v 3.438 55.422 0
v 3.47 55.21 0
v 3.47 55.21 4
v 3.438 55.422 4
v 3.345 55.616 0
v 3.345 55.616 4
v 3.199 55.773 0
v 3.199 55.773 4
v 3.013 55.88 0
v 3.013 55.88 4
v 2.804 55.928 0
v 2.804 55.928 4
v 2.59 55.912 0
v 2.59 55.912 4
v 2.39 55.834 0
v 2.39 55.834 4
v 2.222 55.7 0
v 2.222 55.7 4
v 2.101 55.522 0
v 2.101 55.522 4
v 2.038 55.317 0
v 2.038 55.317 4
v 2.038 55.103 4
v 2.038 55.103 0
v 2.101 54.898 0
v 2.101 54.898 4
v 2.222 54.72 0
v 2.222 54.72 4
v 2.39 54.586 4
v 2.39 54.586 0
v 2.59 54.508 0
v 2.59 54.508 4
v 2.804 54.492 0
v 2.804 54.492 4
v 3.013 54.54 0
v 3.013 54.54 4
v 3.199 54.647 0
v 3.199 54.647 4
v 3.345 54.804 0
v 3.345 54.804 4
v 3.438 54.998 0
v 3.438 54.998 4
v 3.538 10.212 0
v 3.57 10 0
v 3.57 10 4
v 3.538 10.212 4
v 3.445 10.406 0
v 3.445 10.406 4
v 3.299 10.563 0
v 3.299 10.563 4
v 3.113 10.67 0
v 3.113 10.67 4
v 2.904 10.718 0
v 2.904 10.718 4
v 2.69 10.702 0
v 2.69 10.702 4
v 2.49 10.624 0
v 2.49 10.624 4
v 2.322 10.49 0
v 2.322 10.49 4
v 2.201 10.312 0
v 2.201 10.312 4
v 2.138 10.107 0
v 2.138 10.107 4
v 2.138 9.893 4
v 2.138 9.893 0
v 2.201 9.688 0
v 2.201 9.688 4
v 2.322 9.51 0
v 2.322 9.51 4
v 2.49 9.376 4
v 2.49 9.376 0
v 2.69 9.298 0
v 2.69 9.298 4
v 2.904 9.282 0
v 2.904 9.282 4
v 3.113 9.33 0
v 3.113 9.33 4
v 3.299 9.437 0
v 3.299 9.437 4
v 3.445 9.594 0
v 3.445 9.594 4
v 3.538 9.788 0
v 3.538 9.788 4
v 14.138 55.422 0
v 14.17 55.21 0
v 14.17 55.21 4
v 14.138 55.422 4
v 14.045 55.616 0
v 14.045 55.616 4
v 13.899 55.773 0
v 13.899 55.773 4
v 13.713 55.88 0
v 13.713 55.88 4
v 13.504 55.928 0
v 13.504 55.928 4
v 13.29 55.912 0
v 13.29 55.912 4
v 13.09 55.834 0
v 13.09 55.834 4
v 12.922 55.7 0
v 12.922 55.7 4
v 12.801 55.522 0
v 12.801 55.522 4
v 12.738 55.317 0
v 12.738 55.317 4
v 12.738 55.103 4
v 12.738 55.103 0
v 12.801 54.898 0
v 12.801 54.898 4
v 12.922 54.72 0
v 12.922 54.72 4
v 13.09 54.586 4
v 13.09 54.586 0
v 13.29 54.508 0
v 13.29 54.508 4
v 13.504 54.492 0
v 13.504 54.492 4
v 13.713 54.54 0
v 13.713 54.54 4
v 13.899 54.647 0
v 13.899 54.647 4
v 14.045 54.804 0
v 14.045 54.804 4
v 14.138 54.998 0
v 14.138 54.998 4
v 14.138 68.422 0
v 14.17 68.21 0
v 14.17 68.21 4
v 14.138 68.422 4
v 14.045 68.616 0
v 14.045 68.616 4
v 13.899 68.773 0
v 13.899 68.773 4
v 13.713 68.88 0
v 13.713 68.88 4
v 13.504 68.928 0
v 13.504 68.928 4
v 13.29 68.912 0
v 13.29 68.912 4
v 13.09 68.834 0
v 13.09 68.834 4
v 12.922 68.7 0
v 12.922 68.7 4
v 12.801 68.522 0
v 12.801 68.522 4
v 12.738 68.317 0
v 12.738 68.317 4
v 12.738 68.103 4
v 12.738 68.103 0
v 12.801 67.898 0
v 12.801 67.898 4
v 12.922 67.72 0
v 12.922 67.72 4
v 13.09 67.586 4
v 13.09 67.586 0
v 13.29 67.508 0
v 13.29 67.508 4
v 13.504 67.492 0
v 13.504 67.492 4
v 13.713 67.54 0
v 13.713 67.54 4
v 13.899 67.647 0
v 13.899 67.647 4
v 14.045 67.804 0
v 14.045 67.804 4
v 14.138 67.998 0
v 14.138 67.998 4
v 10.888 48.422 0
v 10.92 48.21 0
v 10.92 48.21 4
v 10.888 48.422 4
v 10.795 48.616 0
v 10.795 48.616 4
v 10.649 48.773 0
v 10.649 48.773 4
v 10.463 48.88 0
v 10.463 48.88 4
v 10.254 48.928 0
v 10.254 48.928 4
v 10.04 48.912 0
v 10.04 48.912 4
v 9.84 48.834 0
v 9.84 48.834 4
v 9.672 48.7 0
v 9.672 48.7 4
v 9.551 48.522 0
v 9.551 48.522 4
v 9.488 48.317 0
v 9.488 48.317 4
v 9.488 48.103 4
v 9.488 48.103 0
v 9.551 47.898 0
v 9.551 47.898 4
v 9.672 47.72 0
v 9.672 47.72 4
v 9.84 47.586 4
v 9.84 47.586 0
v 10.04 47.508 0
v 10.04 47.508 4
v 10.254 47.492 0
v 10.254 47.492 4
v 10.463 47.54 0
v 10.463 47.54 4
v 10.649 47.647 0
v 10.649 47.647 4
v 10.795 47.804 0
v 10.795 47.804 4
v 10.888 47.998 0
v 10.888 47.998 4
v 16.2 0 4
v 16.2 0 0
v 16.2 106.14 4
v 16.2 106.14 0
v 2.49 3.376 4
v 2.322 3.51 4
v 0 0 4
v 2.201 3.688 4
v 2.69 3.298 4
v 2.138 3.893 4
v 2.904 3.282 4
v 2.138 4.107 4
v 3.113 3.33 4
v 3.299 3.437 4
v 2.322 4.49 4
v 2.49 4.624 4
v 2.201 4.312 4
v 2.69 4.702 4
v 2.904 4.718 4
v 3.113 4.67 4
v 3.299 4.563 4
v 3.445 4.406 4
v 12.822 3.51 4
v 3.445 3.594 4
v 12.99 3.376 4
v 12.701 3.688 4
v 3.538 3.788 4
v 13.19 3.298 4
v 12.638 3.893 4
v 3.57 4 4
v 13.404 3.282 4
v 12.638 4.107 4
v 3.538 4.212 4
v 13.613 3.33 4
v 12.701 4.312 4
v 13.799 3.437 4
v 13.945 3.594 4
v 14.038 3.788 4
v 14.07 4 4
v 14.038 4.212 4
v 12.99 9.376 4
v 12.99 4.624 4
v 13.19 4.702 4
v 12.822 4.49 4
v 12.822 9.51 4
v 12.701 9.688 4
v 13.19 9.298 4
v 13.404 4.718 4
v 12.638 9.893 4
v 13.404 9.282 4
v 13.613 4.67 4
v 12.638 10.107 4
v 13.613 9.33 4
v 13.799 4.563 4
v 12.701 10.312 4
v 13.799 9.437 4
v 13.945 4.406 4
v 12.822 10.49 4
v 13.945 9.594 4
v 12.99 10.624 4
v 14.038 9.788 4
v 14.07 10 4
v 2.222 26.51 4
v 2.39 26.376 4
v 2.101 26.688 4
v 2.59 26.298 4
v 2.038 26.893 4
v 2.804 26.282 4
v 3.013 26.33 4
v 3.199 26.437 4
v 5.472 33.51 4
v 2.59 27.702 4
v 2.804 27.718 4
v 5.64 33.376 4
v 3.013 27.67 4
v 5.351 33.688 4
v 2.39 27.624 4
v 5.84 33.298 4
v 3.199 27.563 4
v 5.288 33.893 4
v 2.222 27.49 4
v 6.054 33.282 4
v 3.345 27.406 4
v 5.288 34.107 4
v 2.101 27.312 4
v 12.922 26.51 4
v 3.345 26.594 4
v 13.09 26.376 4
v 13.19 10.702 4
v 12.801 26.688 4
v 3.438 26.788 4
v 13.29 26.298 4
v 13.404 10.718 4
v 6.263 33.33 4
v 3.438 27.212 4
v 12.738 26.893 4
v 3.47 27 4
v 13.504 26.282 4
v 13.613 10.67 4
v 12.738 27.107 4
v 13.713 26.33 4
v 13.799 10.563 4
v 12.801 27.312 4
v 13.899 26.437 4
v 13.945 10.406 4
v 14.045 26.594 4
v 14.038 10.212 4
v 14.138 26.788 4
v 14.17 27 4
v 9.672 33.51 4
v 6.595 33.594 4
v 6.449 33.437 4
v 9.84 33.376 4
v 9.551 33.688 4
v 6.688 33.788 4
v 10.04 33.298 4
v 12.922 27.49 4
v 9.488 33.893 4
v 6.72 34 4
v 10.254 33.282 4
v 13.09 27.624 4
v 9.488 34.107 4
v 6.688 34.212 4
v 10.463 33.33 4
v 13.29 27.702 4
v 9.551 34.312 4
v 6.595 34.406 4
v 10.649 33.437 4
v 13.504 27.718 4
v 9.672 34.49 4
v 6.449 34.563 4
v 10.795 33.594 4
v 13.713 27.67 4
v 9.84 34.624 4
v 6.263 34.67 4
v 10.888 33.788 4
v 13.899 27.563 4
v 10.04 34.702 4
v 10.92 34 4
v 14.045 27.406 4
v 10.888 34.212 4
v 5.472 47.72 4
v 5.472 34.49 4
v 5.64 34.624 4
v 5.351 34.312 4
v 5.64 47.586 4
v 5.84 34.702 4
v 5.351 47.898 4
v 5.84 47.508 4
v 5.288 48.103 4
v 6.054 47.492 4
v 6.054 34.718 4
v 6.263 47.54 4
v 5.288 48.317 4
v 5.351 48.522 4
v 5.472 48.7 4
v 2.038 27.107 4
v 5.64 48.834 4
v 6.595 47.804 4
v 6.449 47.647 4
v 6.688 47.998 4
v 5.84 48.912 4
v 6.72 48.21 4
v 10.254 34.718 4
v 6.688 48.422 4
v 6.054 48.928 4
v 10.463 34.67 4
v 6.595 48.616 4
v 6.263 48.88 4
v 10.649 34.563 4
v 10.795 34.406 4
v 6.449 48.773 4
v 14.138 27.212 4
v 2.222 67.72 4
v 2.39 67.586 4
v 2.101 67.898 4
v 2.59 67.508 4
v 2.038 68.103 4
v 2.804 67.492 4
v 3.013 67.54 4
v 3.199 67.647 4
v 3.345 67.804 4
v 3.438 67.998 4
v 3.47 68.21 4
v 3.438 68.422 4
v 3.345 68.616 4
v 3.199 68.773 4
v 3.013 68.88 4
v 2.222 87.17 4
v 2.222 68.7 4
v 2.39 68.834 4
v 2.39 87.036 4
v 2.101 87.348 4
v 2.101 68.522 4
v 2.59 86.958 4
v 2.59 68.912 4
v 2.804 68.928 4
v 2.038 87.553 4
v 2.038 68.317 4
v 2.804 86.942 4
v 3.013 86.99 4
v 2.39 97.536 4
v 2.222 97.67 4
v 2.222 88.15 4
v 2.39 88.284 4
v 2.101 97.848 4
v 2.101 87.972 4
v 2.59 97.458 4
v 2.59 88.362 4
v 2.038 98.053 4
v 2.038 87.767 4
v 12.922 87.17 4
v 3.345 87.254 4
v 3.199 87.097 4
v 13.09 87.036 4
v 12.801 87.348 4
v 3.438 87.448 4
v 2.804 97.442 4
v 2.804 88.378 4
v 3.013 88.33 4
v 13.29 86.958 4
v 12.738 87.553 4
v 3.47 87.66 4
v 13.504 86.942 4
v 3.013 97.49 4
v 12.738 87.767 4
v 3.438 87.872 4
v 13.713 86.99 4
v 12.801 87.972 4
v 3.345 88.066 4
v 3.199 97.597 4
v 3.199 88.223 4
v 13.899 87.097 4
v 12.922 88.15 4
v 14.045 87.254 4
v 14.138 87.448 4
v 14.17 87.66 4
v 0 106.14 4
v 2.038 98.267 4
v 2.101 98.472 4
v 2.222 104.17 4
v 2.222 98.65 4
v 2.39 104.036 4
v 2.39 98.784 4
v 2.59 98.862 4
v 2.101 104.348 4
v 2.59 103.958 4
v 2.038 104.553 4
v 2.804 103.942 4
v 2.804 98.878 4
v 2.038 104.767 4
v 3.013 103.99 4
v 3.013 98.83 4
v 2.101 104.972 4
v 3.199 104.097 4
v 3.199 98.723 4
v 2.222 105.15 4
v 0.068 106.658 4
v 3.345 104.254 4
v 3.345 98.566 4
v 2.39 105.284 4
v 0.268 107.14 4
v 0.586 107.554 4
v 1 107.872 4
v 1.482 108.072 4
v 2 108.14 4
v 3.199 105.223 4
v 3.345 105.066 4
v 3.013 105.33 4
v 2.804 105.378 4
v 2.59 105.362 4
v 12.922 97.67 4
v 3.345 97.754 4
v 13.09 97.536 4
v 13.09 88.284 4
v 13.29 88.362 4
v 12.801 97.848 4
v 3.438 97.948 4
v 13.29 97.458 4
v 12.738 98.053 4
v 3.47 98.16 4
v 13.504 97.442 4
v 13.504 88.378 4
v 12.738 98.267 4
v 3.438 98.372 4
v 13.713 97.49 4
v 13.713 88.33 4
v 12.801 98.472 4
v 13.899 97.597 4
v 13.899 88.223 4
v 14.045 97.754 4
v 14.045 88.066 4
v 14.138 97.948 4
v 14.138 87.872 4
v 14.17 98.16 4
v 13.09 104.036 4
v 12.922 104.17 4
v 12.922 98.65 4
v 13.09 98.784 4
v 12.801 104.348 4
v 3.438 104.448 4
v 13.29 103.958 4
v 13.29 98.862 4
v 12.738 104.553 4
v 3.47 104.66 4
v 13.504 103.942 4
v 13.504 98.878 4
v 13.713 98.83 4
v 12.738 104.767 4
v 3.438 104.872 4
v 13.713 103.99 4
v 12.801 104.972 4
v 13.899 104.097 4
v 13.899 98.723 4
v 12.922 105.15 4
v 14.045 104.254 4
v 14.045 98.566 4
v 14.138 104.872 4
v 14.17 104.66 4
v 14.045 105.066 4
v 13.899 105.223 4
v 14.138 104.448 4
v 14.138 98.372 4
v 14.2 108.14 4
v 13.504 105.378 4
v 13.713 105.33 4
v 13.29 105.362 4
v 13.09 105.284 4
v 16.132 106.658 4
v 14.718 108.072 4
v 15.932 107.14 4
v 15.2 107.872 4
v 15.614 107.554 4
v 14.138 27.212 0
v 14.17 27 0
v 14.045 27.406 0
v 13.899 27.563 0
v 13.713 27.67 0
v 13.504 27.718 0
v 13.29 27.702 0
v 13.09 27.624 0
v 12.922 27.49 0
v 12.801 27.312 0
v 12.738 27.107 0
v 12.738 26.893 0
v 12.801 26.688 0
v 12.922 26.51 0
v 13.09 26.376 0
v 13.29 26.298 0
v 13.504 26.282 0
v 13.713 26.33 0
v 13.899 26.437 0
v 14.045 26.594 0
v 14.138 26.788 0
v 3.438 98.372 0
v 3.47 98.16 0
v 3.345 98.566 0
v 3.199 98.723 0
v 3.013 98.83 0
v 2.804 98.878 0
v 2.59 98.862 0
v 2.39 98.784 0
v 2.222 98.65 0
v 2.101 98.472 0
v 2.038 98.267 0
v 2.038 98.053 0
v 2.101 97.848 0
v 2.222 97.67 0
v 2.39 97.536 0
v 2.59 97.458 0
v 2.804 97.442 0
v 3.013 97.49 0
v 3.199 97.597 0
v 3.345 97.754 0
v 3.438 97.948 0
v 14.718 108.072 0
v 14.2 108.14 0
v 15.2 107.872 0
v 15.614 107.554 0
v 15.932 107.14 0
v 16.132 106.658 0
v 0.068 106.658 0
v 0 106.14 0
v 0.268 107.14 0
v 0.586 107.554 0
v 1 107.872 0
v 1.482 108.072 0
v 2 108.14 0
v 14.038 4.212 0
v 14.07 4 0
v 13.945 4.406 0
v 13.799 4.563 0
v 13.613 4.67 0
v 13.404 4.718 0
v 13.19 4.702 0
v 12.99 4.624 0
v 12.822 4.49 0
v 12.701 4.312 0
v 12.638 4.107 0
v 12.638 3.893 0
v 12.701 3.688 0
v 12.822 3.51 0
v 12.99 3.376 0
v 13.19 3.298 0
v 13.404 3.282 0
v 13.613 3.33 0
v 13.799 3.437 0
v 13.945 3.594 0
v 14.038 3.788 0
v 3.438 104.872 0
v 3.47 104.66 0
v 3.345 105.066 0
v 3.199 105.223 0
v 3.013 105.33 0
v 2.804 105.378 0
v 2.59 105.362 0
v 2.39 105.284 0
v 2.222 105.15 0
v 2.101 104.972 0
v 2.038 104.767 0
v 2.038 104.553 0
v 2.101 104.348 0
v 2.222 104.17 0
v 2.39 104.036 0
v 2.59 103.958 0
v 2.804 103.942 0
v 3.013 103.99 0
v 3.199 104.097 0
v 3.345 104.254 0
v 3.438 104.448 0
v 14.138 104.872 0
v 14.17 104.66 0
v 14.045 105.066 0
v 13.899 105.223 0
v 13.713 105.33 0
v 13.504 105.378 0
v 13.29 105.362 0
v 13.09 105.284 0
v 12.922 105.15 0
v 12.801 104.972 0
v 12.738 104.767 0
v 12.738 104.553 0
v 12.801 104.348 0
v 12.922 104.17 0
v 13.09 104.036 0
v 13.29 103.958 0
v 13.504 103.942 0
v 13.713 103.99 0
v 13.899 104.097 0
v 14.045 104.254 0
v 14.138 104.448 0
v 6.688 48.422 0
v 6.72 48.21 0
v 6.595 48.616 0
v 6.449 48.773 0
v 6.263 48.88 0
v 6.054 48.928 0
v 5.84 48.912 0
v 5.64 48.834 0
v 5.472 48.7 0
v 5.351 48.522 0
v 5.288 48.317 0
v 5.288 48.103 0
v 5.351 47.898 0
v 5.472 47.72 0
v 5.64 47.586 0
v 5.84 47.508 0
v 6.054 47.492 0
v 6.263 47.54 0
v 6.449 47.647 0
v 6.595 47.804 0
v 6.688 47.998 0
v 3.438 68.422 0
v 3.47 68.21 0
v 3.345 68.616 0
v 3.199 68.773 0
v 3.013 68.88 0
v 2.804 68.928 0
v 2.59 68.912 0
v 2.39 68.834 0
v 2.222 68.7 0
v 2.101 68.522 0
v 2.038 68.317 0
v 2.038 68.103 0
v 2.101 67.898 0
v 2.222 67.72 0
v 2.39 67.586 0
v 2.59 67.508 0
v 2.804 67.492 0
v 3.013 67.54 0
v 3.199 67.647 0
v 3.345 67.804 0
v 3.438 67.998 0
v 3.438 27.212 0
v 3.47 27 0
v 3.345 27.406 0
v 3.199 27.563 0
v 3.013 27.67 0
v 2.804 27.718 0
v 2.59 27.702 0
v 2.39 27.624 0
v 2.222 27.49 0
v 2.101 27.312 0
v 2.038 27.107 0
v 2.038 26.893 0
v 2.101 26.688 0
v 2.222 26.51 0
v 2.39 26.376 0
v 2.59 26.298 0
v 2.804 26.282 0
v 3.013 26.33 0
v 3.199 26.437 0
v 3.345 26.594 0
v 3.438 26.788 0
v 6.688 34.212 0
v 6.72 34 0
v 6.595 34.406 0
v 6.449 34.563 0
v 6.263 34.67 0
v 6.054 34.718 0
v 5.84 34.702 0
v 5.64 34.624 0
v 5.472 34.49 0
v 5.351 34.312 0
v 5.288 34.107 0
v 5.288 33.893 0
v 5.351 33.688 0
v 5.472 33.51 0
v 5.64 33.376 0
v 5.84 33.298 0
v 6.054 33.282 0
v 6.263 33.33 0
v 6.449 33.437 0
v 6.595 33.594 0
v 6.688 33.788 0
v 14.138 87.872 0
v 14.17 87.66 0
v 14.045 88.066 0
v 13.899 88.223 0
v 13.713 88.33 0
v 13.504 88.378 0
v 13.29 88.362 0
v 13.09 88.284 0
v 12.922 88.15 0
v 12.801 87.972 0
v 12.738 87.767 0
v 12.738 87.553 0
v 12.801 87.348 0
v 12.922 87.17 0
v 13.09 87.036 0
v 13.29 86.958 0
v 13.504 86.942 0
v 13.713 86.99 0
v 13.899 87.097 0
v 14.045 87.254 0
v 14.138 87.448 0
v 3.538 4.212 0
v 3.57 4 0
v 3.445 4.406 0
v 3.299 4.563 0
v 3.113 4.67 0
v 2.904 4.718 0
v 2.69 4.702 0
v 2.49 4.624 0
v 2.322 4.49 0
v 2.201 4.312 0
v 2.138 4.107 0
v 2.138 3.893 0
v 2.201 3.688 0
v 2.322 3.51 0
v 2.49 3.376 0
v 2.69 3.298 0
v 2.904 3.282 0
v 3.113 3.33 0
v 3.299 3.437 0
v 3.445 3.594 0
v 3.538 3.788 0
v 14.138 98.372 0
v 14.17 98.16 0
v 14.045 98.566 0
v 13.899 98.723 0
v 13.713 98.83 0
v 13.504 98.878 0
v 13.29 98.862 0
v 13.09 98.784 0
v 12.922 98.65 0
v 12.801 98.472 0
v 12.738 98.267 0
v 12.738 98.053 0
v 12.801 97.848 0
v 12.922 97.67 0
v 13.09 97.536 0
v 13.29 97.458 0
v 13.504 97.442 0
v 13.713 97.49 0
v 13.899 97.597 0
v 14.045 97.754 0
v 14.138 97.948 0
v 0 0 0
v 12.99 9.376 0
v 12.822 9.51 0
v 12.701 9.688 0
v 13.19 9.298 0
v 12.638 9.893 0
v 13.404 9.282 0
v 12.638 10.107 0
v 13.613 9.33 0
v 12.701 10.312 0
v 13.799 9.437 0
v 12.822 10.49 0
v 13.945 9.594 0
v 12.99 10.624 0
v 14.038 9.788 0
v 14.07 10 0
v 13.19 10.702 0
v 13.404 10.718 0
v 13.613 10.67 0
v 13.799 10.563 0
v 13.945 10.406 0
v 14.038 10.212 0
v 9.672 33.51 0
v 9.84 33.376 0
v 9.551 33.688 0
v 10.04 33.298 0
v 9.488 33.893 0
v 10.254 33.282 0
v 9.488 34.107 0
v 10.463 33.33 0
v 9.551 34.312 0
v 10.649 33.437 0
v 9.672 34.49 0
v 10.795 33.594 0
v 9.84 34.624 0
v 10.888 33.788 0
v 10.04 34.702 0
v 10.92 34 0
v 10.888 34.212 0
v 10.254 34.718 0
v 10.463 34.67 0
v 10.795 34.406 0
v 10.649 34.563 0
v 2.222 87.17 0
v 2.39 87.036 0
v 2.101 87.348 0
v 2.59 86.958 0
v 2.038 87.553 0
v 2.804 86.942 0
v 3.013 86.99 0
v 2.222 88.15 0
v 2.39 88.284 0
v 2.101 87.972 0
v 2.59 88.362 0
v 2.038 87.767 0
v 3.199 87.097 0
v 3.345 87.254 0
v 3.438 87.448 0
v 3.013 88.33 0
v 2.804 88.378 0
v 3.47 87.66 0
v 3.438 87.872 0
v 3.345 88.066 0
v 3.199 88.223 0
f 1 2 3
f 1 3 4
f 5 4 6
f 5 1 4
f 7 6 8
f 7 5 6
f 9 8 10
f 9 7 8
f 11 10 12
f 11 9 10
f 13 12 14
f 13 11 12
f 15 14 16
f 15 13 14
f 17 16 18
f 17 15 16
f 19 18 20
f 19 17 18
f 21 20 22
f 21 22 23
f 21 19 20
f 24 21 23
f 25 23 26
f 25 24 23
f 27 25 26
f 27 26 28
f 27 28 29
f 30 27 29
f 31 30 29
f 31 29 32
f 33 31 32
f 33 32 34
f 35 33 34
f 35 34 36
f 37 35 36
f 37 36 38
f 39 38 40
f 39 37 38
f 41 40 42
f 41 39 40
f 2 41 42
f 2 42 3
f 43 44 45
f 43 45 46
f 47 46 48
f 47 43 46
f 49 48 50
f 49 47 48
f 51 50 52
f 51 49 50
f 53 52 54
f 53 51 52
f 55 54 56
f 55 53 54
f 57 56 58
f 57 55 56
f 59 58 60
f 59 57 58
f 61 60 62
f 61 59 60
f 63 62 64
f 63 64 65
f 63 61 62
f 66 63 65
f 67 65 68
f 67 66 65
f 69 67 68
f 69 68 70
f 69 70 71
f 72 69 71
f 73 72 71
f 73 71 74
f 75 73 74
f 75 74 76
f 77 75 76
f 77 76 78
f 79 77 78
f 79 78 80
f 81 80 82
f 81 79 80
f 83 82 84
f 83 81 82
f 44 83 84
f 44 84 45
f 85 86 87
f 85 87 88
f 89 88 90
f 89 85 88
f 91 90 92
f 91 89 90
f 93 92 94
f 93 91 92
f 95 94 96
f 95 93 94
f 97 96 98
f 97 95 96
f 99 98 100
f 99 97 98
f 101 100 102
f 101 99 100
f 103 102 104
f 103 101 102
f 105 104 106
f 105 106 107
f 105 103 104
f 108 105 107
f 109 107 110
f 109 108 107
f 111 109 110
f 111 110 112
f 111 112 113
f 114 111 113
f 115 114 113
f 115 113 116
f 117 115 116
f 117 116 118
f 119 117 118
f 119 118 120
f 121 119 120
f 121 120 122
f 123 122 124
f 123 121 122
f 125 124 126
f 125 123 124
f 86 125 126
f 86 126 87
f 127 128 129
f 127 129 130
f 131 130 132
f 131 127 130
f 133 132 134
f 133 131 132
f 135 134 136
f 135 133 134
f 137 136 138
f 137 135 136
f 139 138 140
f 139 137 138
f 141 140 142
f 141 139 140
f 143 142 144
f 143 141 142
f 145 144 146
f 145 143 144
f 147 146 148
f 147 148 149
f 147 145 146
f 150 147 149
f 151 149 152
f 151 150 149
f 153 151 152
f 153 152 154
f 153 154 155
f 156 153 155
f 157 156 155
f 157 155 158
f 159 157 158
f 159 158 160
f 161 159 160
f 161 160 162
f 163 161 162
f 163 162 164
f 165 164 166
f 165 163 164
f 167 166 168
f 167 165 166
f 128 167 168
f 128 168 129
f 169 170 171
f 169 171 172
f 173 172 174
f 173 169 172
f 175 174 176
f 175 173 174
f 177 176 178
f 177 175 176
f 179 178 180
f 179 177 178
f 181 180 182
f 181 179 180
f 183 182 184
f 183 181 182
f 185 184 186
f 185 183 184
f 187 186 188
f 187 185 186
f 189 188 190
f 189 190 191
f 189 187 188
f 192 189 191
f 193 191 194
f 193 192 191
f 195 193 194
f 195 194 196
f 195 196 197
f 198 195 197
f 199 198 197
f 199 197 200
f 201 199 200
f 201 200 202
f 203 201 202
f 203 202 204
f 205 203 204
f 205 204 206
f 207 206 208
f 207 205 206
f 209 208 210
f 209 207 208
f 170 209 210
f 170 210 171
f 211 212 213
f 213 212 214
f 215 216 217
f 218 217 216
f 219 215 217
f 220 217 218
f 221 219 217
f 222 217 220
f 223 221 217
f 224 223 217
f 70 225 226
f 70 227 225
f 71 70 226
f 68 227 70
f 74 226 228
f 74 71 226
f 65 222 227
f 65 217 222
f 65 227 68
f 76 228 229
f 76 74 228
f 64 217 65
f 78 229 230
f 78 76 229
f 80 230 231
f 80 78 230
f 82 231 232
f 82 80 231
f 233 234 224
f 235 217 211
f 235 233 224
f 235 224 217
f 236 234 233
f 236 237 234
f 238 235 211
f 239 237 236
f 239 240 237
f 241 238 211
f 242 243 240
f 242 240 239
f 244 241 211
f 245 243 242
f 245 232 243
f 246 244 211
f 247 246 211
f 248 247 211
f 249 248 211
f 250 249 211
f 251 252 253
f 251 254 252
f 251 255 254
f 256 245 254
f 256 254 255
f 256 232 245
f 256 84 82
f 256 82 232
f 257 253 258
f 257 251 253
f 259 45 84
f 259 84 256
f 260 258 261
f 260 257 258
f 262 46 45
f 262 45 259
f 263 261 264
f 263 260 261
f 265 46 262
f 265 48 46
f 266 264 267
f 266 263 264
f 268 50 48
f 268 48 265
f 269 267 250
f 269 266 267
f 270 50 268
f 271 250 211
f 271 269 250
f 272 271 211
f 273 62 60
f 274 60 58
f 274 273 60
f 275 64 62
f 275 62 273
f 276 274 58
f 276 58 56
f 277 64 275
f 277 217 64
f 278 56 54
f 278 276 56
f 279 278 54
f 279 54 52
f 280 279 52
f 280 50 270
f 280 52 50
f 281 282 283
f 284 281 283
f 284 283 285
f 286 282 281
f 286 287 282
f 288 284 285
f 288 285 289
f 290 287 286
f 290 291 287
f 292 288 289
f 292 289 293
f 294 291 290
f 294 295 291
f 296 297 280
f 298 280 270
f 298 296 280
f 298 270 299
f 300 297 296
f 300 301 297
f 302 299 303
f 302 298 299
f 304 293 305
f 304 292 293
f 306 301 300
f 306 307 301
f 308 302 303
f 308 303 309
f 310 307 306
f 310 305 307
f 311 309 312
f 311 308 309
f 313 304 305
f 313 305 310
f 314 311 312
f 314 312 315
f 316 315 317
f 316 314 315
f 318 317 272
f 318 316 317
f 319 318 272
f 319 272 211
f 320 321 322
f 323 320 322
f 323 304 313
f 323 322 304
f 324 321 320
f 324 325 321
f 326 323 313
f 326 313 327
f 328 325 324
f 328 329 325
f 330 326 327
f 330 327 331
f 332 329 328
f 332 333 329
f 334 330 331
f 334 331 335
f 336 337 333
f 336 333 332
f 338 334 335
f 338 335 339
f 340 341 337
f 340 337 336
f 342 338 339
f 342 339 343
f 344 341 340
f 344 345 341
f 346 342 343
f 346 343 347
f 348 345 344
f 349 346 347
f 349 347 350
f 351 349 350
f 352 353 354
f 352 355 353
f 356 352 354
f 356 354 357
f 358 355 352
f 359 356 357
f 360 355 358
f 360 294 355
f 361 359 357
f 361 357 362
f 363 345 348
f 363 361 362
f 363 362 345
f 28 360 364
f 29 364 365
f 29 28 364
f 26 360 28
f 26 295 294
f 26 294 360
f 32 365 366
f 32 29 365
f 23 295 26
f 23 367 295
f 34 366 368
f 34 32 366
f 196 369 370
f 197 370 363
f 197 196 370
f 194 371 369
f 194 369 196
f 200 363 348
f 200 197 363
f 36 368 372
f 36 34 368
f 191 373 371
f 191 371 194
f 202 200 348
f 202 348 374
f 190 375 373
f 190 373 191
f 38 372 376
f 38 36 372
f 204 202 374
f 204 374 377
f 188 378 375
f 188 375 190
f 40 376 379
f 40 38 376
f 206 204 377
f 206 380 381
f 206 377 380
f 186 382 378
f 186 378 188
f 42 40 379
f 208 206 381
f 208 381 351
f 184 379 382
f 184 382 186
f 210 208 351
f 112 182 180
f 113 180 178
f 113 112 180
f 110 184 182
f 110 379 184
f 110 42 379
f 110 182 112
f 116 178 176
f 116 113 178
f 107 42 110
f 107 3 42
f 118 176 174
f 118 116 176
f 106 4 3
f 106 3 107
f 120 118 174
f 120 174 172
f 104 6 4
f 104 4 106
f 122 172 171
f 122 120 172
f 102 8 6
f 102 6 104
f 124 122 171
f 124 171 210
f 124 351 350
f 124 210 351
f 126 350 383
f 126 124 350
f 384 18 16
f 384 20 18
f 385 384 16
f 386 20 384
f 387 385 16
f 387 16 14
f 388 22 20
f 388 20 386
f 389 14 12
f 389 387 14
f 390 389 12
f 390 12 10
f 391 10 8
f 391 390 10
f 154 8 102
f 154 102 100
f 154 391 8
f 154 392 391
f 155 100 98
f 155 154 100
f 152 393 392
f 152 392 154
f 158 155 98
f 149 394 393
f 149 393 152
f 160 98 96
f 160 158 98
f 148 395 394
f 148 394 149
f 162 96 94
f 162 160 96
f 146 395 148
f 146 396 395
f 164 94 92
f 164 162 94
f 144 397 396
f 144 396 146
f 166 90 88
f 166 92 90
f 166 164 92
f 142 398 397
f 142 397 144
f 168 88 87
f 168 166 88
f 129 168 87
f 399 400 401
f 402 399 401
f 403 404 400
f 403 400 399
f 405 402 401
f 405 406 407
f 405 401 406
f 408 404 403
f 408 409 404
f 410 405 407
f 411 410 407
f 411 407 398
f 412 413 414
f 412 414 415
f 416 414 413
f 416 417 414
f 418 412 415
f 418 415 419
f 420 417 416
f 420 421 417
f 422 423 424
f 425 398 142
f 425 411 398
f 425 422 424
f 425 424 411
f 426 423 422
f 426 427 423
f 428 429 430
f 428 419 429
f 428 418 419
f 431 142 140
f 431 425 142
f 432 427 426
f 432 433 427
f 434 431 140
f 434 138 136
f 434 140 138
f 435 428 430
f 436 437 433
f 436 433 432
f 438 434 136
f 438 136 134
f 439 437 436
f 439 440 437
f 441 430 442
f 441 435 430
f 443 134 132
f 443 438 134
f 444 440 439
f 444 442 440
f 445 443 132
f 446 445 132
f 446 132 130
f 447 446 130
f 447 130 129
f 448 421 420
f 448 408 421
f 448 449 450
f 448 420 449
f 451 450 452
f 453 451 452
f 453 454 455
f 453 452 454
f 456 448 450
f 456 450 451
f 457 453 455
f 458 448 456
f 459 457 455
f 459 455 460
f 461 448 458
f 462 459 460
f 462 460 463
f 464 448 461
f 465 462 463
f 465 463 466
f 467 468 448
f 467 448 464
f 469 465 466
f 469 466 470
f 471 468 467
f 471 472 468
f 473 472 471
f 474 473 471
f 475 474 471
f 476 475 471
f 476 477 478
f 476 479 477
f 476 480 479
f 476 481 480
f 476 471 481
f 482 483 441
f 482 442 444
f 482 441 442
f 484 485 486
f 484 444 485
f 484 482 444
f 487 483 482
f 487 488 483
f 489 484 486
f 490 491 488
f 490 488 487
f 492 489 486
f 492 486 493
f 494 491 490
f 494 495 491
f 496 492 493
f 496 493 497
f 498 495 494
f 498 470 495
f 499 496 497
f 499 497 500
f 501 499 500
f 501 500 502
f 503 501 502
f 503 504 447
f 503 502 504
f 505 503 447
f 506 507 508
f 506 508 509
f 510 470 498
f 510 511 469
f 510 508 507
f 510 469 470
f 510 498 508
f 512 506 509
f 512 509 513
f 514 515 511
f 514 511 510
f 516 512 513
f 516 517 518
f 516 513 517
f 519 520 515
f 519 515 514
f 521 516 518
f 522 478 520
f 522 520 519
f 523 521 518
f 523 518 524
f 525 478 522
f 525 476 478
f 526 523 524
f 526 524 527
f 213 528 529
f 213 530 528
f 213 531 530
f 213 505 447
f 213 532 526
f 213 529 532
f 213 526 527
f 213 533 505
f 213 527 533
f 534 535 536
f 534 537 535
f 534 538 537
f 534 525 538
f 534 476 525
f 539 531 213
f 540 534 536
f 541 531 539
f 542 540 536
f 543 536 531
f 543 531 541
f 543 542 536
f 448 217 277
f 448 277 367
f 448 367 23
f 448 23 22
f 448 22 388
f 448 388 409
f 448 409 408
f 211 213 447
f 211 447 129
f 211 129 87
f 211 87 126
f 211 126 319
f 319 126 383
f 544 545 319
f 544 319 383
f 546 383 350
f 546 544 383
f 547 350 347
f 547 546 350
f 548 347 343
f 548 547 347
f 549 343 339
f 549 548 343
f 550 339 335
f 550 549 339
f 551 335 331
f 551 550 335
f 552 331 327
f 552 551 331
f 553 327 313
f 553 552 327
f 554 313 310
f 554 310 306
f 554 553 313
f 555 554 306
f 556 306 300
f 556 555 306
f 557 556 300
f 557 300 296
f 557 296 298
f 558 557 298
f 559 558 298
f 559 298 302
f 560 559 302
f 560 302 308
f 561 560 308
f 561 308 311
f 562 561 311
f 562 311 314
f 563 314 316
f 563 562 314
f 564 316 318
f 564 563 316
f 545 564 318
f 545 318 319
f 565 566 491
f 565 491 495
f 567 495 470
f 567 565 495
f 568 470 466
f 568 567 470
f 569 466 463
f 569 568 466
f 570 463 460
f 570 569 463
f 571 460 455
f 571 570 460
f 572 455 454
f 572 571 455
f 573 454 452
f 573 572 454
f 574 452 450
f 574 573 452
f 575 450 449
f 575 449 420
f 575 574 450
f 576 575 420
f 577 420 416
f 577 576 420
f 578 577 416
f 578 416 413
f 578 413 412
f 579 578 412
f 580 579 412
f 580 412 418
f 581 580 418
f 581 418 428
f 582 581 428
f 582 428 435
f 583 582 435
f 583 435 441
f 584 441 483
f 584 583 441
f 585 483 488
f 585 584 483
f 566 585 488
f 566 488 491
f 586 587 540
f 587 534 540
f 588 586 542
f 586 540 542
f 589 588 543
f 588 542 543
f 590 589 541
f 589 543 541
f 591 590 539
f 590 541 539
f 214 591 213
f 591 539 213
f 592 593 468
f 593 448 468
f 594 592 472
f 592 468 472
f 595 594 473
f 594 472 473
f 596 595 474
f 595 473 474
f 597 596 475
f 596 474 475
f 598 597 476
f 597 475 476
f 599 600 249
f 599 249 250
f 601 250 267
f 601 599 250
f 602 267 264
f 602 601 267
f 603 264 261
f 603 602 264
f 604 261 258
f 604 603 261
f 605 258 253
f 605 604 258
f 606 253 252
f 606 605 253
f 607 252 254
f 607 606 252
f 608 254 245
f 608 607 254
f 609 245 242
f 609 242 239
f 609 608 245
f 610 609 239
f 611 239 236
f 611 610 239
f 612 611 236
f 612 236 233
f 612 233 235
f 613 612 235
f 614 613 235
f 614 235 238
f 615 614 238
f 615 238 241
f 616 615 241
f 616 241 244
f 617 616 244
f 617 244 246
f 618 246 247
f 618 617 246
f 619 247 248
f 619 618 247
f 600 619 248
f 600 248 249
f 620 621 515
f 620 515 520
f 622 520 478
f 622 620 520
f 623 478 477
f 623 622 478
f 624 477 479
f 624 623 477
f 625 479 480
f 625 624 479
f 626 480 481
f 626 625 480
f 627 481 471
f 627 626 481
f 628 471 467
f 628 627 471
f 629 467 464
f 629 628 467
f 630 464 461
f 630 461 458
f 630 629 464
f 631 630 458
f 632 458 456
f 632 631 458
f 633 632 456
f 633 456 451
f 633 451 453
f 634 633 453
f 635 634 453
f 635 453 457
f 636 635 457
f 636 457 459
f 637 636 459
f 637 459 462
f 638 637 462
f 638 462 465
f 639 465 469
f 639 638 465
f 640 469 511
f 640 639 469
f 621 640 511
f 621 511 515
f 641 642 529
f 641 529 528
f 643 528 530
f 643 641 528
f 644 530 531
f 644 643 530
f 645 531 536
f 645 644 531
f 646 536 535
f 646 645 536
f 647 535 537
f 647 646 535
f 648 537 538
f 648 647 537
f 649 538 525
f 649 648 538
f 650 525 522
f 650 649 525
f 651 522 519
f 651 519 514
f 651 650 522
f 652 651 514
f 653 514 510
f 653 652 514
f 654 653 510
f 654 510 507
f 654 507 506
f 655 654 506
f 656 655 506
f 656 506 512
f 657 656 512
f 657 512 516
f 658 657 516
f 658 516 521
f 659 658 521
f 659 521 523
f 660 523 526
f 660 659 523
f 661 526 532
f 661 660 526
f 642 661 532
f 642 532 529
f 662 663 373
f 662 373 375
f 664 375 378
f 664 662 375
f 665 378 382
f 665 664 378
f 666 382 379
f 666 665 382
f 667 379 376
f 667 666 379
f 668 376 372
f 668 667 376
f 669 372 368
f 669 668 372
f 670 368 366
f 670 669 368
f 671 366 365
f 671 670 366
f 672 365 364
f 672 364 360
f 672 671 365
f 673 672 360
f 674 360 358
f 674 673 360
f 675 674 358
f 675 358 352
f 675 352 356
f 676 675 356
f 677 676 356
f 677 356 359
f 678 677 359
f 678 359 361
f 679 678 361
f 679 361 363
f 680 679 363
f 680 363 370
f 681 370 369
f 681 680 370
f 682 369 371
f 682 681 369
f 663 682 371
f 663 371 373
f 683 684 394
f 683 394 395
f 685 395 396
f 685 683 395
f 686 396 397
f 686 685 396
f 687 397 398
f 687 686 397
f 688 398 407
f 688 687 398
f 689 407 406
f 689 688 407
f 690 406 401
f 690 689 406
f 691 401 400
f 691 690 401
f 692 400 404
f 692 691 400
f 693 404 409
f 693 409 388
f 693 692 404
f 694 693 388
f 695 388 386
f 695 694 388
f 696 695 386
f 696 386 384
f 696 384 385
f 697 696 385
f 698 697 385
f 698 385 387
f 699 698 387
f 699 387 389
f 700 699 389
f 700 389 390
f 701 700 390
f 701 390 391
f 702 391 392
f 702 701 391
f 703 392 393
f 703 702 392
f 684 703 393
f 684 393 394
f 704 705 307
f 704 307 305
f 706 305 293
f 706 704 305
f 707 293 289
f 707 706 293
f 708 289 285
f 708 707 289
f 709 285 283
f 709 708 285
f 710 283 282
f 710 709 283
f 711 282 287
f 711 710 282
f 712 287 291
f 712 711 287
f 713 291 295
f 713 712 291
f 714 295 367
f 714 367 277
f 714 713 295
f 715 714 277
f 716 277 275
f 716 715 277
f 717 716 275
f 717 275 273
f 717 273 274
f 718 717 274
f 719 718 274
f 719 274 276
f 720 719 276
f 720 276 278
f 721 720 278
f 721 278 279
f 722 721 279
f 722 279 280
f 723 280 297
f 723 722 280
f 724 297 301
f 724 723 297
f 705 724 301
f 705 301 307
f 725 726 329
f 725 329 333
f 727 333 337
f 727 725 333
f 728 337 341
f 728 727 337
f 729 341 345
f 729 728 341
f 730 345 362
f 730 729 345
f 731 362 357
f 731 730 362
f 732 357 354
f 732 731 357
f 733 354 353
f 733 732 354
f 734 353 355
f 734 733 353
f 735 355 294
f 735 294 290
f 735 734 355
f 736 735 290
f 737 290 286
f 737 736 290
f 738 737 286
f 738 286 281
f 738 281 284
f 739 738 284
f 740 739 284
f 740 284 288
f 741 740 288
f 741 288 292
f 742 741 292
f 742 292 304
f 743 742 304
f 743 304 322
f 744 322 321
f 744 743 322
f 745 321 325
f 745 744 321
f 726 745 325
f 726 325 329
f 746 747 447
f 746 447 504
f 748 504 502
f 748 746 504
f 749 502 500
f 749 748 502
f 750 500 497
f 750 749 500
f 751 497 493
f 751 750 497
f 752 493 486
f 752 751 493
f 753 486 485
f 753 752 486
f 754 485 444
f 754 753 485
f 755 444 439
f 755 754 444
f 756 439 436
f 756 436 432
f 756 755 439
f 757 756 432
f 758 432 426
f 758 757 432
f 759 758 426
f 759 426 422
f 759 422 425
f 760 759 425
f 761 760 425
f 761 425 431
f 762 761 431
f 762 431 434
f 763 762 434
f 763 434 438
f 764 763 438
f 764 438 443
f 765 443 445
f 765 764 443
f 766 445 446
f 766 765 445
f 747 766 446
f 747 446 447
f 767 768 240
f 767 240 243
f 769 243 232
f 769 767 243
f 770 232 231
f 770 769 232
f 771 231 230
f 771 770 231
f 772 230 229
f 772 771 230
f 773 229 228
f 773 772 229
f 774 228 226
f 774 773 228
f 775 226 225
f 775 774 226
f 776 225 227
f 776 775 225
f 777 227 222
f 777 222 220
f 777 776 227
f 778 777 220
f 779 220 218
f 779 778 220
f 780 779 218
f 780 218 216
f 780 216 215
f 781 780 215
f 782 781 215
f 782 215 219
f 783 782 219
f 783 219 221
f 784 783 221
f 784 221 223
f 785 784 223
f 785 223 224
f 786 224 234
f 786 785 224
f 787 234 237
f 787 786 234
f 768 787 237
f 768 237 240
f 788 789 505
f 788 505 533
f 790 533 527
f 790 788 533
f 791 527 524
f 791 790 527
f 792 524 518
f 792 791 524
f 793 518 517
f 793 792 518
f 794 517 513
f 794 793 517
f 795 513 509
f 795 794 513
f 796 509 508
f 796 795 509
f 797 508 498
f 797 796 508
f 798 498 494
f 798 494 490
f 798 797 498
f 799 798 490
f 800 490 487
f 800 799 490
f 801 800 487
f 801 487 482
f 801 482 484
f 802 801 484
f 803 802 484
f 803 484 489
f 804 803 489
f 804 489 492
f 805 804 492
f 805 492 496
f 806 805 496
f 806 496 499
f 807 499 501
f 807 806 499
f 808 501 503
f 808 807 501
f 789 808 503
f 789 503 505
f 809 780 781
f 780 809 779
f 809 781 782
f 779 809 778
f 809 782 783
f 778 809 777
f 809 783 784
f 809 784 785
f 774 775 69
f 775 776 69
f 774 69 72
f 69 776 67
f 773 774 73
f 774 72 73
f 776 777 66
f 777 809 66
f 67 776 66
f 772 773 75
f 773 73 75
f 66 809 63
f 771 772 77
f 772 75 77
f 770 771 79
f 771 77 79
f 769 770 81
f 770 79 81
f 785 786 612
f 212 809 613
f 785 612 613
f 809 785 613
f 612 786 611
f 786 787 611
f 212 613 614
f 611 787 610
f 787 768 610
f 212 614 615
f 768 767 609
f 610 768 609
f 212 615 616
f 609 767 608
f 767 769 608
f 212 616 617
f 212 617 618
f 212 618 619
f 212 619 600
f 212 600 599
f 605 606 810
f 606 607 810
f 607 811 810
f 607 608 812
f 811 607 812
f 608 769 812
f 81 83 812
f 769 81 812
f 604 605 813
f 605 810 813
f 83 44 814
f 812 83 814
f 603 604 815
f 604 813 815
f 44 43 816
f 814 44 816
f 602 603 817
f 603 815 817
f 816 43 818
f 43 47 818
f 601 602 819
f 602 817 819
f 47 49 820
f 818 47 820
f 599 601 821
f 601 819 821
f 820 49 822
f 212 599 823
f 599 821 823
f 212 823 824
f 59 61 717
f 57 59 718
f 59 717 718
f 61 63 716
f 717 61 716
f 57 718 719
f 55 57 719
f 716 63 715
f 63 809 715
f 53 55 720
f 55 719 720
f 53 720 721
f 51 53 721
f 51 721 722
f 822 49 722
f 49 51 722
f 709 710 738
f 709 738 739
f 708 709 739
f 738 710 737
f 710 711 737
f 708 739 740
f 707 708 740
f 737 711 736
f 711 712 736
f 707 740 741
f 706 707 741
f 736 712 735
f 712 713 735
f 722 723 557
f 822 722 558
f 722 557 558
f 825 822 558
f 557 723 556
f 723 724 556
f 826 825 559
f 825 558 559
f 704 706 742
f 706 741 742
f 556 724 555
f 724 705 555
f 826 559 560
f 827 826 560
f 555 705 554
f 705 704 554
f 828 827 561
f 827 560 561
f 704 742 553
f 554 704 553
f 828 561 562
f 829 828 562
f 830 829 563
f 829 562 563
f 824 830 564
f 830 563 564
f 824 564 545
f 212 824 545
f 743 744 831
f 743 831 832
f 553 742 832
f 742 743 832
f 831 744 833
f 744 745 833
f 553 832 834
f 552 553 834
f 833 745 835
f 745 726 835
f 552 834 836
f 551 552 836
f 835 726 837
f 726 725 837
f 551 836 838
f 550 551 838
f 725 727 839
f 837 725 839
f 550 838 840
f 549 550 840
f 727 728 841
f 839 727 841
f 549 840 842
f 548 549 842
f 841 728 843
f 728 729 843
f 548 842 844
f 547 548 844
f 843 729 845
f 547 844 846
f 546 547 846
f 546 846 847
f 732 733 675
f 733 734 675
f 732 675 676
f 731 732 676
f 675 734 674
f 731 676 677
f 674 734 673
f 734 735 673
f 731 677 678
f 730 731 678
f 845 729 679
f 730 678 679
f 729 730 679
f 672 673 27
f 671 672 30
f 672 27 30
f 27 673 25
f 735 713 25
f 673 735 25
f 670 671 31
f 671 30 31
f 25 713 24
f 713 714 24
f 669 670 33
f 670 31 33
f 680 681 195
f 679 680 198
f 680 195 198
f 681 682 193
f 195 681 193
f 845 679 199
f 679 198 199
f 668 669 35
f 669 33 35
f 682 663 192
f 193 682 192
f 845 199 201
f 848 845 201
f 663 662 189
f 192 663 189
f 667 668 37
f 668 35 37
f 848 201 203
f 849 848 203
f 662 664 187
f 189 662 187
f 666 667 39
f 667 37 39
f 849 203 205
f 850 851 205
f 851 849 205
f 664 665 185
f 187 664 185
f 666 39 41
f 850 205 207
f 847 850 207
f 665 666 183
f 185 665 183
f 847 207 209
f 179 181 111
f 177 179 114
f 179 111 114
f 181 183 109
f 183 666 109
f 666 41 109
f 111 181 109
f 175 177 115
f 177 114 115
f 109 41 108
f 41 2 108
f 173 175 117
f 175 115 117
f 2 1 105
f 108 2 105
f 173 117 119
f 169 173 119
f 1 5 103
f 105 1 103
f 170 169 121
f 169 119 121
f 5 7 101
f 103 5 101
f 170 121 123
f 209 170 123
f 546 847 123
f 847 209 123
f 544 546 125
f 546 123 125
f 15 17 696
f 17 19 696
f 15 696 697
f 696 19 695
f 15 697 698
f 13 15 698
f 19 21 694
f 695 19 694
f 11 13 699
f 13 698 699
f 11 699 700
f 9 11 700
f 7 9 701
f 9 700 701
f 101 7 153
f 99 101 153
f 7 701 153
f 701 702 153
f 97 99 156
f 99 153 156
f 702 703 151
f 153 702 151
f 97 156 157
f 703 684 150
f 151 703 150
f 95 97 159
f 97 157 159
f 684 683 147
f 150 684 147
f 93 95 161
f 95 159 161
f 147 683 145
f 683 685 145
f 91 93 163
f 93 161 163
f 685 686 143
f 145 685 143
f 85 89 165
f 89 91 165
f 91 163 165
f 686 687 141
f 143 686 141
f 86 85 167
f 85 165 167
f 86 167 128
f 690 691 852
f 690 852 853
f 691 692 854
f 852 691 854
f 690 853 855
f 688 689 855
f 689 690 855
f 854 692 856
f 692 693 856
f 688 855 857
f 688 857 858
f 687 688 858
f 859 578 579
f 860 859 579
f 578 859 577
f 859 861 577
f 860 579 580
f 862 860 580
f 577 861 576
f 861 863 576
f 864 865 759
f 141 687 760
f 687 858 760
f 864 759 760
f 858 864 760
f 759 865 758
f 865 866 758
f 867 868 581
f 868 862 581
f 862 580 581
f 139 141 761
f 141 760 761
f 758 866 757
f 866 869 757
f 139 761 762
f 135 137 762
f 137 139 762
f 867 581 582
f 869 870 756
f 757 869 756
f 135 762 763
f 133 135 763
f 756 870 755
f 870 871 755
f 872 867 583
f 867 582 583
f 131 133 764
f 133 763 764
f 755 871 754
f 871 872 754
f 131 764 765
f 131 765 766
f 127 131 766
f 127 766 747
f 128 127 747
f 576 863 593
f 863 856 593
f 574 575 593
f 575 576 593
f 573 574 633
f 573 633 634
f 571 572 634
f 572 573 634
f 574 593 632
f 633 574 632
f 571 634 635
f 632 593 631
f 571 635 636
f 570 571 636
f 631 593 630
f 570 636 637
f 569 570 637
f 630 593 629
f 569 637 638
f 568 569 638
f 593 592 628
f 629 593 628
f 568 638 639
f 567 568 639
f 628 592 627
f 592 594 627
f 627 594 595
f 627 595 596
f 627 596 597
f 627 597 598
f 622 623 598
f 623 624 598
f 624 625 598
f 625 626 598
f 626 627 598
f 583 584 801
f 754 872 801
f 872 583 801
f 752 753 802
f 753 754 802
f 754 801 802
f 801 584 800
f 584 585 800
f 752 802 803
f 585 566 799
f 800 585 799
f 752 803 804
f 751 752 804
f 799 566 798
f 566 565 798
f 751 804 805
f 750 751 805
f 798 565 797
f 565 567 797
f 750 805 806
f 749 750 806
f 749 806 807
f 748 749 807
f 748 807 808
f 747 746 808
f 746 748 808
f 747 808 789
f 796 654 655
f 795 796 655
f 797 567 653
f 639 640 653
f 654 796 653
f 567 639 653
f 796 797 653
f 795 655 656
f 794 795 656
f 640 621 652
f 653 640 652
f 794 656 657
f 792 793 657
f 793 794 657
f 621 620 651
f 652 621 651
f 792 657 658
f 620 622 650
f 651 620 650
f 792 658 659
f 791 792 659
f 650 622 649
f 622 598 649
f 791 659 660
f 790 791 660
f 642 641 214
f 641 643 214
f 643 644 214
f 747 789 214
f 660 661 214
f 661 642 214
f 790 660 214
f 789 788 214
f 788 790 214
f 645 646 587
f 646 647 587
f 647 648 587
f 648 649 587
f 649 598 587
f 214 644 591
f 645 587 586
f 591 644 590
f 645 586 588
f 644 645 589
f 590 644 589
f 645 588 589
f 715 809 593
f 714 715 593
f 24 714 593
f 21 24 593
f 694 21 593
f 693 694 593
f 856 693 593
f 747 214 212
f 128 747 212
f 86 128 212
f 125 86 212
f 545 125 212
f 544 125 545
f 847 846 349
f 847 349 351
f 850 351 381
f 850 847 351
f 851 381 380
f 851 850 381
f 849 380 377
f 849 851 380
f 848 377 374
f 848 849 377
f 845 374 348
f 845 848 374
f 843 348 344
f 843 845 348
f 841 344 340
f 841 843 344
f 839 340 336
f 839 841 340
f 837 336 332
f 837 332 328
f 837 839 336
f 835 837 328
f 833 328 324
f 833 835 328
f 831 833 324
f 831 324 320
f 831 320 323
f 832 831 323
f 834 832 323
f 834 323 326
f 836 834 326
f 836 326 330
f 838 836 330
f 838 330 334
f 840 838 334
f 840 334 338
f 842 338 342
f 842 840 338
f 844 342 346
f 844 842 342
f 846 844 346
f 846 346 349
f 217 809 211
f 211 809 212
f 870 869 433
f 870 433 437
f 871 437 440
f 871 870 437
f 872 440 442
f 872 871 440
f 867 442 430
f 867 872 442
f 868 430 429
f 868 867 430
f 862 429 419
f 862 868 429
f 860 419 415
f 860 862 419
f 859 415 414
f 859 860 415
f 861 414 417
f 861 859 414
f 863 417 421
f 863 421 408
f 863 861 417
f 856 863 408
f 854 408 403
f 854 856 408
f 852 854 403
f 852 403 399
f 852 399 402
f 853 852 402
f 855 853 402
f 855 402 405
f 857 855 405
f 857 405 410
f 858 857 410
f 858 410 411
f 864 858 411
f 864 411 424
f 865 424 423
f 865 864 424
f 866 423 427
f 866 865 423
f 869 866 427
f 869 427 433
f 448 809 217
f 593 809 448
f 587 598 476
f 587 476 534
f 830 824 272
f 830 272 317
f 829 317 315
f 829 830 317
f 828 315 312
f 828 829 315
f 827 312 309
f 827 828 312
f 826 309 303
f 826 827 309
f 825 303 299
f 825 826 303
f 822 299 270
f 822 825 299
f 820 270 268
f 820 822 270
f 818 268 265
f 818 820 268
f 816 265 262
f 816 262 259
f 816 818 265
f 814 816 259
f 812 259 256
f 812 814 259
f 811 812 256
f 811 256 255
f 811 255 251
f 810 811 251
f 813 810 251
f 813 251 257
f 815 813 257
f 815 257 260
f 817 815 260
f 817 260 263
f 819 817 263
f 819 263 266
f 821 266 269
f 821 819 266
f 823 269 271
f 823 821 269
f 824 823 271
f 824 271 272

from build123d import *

# Parameters (mm, degrees)
SKETCH1_W           = 16.2
SKETCH1_H           = 108.14
SKETCH1_R           = 0.72
BOSS_EXTRUDE1_DEPTH = 4
FILLET1_R           = 2


with BuildPart() as part:
    # Sketch1 → Boss-Extrude1 (new body)
    with BuildSketch(Plane.XY):
        with Locations((8.1, 54.07)):
            Rectangle(SKETCH1_W, SKETCH1_H)
        with Locations((13.45, 55.21)):
            Circle(SKETCH1_R, mode=Mode.SUBTRACT)
        with Locations((10.2, 48.21)):
            Circle(SKETCH1_R, mode=Mode.SUBTRACT)
        with Locations((13.45, 104.66)):
            Circle(SKETCH1_R, mode=Mode.SUBTRACT)
        with Locations((2.75, 98.16)):
            Circle(SKETCH1_R, mode=Mode.SUBTRACT)
        with Locations((6, 48.21)):
            Circle(SKETCH1_R, mode=Mode.SUBTRACT)
        with Locations((2.75, 27)):
            Circle(SKETCH1_R, mode=Mode.SUBTRACT)
        with Locations((2.75, 87.66)):
            Circle(SKETCH1_R, mode=Mode.SUBTRACT)
        with Locations((2.75, 55.21)):
            Circle(SKETCH1_R, mode=Mode.SUBTRACT)
        with Locations((13.45, 87.66)):
            Circle(SKETCH1_R, mode=Mode.SUBTRACT)
        with Locations((13.45, 98.16)):
            Circle(SKETCH1_R, mode=Mode.SUBTRACT)
        with Locations((13.45, 68.21)):
            Circle(SKETCH1_R, mode=Mode.SUBTRACT)
        with Locations((6, 34)):
            Circle(SKETCH1_R, mode=Mode.SUBTRACT)
        with Locations((2.75, 104.66)):
            Circle(SKETCH1_R, mode=Mode.SUBTRACT)
        with Locations((10.2, 34)):
            Circle(SKETCH1_R, mode=Mode.SUBTRACT)
        with Locations((2.75, 68.21)):
            Circle(SKETCH1_R, mode=Mode.SUBTRACT)
        with Locations((13.45, 27)):
            Circle(SKETCH1_R, mode=Mode.SUBTRACT)
        with Locations((2.85, 10)):
            Circle(SKETCH1_R, mode=Mode.SUBTRACT)
        with Locations((13.35, 10)):
            Circle(SKETCH1_R, mode=Mode.SUBTRACT)
        with Locations((13.35, 4)):
            Circle(SKETCH1_R, mode=Mode.SUBTRACT)
        with Locations((2.85, 4)):
            Circle(SKETCH1_R, mode=Mode.SUBTRACT)
    extrude(amount=BOSS_EXTRUDE1_DEPTH)

    # Fillet1
    fillet1_edges = [part.edges().sort_by_distance(p)[0] for p in [
        (0, 108.14, 2),
        (16.2, 108.14, 2),
    ]]
    fillet(fillet1_edges, radius=FILLET1_R)


solid = part.part
